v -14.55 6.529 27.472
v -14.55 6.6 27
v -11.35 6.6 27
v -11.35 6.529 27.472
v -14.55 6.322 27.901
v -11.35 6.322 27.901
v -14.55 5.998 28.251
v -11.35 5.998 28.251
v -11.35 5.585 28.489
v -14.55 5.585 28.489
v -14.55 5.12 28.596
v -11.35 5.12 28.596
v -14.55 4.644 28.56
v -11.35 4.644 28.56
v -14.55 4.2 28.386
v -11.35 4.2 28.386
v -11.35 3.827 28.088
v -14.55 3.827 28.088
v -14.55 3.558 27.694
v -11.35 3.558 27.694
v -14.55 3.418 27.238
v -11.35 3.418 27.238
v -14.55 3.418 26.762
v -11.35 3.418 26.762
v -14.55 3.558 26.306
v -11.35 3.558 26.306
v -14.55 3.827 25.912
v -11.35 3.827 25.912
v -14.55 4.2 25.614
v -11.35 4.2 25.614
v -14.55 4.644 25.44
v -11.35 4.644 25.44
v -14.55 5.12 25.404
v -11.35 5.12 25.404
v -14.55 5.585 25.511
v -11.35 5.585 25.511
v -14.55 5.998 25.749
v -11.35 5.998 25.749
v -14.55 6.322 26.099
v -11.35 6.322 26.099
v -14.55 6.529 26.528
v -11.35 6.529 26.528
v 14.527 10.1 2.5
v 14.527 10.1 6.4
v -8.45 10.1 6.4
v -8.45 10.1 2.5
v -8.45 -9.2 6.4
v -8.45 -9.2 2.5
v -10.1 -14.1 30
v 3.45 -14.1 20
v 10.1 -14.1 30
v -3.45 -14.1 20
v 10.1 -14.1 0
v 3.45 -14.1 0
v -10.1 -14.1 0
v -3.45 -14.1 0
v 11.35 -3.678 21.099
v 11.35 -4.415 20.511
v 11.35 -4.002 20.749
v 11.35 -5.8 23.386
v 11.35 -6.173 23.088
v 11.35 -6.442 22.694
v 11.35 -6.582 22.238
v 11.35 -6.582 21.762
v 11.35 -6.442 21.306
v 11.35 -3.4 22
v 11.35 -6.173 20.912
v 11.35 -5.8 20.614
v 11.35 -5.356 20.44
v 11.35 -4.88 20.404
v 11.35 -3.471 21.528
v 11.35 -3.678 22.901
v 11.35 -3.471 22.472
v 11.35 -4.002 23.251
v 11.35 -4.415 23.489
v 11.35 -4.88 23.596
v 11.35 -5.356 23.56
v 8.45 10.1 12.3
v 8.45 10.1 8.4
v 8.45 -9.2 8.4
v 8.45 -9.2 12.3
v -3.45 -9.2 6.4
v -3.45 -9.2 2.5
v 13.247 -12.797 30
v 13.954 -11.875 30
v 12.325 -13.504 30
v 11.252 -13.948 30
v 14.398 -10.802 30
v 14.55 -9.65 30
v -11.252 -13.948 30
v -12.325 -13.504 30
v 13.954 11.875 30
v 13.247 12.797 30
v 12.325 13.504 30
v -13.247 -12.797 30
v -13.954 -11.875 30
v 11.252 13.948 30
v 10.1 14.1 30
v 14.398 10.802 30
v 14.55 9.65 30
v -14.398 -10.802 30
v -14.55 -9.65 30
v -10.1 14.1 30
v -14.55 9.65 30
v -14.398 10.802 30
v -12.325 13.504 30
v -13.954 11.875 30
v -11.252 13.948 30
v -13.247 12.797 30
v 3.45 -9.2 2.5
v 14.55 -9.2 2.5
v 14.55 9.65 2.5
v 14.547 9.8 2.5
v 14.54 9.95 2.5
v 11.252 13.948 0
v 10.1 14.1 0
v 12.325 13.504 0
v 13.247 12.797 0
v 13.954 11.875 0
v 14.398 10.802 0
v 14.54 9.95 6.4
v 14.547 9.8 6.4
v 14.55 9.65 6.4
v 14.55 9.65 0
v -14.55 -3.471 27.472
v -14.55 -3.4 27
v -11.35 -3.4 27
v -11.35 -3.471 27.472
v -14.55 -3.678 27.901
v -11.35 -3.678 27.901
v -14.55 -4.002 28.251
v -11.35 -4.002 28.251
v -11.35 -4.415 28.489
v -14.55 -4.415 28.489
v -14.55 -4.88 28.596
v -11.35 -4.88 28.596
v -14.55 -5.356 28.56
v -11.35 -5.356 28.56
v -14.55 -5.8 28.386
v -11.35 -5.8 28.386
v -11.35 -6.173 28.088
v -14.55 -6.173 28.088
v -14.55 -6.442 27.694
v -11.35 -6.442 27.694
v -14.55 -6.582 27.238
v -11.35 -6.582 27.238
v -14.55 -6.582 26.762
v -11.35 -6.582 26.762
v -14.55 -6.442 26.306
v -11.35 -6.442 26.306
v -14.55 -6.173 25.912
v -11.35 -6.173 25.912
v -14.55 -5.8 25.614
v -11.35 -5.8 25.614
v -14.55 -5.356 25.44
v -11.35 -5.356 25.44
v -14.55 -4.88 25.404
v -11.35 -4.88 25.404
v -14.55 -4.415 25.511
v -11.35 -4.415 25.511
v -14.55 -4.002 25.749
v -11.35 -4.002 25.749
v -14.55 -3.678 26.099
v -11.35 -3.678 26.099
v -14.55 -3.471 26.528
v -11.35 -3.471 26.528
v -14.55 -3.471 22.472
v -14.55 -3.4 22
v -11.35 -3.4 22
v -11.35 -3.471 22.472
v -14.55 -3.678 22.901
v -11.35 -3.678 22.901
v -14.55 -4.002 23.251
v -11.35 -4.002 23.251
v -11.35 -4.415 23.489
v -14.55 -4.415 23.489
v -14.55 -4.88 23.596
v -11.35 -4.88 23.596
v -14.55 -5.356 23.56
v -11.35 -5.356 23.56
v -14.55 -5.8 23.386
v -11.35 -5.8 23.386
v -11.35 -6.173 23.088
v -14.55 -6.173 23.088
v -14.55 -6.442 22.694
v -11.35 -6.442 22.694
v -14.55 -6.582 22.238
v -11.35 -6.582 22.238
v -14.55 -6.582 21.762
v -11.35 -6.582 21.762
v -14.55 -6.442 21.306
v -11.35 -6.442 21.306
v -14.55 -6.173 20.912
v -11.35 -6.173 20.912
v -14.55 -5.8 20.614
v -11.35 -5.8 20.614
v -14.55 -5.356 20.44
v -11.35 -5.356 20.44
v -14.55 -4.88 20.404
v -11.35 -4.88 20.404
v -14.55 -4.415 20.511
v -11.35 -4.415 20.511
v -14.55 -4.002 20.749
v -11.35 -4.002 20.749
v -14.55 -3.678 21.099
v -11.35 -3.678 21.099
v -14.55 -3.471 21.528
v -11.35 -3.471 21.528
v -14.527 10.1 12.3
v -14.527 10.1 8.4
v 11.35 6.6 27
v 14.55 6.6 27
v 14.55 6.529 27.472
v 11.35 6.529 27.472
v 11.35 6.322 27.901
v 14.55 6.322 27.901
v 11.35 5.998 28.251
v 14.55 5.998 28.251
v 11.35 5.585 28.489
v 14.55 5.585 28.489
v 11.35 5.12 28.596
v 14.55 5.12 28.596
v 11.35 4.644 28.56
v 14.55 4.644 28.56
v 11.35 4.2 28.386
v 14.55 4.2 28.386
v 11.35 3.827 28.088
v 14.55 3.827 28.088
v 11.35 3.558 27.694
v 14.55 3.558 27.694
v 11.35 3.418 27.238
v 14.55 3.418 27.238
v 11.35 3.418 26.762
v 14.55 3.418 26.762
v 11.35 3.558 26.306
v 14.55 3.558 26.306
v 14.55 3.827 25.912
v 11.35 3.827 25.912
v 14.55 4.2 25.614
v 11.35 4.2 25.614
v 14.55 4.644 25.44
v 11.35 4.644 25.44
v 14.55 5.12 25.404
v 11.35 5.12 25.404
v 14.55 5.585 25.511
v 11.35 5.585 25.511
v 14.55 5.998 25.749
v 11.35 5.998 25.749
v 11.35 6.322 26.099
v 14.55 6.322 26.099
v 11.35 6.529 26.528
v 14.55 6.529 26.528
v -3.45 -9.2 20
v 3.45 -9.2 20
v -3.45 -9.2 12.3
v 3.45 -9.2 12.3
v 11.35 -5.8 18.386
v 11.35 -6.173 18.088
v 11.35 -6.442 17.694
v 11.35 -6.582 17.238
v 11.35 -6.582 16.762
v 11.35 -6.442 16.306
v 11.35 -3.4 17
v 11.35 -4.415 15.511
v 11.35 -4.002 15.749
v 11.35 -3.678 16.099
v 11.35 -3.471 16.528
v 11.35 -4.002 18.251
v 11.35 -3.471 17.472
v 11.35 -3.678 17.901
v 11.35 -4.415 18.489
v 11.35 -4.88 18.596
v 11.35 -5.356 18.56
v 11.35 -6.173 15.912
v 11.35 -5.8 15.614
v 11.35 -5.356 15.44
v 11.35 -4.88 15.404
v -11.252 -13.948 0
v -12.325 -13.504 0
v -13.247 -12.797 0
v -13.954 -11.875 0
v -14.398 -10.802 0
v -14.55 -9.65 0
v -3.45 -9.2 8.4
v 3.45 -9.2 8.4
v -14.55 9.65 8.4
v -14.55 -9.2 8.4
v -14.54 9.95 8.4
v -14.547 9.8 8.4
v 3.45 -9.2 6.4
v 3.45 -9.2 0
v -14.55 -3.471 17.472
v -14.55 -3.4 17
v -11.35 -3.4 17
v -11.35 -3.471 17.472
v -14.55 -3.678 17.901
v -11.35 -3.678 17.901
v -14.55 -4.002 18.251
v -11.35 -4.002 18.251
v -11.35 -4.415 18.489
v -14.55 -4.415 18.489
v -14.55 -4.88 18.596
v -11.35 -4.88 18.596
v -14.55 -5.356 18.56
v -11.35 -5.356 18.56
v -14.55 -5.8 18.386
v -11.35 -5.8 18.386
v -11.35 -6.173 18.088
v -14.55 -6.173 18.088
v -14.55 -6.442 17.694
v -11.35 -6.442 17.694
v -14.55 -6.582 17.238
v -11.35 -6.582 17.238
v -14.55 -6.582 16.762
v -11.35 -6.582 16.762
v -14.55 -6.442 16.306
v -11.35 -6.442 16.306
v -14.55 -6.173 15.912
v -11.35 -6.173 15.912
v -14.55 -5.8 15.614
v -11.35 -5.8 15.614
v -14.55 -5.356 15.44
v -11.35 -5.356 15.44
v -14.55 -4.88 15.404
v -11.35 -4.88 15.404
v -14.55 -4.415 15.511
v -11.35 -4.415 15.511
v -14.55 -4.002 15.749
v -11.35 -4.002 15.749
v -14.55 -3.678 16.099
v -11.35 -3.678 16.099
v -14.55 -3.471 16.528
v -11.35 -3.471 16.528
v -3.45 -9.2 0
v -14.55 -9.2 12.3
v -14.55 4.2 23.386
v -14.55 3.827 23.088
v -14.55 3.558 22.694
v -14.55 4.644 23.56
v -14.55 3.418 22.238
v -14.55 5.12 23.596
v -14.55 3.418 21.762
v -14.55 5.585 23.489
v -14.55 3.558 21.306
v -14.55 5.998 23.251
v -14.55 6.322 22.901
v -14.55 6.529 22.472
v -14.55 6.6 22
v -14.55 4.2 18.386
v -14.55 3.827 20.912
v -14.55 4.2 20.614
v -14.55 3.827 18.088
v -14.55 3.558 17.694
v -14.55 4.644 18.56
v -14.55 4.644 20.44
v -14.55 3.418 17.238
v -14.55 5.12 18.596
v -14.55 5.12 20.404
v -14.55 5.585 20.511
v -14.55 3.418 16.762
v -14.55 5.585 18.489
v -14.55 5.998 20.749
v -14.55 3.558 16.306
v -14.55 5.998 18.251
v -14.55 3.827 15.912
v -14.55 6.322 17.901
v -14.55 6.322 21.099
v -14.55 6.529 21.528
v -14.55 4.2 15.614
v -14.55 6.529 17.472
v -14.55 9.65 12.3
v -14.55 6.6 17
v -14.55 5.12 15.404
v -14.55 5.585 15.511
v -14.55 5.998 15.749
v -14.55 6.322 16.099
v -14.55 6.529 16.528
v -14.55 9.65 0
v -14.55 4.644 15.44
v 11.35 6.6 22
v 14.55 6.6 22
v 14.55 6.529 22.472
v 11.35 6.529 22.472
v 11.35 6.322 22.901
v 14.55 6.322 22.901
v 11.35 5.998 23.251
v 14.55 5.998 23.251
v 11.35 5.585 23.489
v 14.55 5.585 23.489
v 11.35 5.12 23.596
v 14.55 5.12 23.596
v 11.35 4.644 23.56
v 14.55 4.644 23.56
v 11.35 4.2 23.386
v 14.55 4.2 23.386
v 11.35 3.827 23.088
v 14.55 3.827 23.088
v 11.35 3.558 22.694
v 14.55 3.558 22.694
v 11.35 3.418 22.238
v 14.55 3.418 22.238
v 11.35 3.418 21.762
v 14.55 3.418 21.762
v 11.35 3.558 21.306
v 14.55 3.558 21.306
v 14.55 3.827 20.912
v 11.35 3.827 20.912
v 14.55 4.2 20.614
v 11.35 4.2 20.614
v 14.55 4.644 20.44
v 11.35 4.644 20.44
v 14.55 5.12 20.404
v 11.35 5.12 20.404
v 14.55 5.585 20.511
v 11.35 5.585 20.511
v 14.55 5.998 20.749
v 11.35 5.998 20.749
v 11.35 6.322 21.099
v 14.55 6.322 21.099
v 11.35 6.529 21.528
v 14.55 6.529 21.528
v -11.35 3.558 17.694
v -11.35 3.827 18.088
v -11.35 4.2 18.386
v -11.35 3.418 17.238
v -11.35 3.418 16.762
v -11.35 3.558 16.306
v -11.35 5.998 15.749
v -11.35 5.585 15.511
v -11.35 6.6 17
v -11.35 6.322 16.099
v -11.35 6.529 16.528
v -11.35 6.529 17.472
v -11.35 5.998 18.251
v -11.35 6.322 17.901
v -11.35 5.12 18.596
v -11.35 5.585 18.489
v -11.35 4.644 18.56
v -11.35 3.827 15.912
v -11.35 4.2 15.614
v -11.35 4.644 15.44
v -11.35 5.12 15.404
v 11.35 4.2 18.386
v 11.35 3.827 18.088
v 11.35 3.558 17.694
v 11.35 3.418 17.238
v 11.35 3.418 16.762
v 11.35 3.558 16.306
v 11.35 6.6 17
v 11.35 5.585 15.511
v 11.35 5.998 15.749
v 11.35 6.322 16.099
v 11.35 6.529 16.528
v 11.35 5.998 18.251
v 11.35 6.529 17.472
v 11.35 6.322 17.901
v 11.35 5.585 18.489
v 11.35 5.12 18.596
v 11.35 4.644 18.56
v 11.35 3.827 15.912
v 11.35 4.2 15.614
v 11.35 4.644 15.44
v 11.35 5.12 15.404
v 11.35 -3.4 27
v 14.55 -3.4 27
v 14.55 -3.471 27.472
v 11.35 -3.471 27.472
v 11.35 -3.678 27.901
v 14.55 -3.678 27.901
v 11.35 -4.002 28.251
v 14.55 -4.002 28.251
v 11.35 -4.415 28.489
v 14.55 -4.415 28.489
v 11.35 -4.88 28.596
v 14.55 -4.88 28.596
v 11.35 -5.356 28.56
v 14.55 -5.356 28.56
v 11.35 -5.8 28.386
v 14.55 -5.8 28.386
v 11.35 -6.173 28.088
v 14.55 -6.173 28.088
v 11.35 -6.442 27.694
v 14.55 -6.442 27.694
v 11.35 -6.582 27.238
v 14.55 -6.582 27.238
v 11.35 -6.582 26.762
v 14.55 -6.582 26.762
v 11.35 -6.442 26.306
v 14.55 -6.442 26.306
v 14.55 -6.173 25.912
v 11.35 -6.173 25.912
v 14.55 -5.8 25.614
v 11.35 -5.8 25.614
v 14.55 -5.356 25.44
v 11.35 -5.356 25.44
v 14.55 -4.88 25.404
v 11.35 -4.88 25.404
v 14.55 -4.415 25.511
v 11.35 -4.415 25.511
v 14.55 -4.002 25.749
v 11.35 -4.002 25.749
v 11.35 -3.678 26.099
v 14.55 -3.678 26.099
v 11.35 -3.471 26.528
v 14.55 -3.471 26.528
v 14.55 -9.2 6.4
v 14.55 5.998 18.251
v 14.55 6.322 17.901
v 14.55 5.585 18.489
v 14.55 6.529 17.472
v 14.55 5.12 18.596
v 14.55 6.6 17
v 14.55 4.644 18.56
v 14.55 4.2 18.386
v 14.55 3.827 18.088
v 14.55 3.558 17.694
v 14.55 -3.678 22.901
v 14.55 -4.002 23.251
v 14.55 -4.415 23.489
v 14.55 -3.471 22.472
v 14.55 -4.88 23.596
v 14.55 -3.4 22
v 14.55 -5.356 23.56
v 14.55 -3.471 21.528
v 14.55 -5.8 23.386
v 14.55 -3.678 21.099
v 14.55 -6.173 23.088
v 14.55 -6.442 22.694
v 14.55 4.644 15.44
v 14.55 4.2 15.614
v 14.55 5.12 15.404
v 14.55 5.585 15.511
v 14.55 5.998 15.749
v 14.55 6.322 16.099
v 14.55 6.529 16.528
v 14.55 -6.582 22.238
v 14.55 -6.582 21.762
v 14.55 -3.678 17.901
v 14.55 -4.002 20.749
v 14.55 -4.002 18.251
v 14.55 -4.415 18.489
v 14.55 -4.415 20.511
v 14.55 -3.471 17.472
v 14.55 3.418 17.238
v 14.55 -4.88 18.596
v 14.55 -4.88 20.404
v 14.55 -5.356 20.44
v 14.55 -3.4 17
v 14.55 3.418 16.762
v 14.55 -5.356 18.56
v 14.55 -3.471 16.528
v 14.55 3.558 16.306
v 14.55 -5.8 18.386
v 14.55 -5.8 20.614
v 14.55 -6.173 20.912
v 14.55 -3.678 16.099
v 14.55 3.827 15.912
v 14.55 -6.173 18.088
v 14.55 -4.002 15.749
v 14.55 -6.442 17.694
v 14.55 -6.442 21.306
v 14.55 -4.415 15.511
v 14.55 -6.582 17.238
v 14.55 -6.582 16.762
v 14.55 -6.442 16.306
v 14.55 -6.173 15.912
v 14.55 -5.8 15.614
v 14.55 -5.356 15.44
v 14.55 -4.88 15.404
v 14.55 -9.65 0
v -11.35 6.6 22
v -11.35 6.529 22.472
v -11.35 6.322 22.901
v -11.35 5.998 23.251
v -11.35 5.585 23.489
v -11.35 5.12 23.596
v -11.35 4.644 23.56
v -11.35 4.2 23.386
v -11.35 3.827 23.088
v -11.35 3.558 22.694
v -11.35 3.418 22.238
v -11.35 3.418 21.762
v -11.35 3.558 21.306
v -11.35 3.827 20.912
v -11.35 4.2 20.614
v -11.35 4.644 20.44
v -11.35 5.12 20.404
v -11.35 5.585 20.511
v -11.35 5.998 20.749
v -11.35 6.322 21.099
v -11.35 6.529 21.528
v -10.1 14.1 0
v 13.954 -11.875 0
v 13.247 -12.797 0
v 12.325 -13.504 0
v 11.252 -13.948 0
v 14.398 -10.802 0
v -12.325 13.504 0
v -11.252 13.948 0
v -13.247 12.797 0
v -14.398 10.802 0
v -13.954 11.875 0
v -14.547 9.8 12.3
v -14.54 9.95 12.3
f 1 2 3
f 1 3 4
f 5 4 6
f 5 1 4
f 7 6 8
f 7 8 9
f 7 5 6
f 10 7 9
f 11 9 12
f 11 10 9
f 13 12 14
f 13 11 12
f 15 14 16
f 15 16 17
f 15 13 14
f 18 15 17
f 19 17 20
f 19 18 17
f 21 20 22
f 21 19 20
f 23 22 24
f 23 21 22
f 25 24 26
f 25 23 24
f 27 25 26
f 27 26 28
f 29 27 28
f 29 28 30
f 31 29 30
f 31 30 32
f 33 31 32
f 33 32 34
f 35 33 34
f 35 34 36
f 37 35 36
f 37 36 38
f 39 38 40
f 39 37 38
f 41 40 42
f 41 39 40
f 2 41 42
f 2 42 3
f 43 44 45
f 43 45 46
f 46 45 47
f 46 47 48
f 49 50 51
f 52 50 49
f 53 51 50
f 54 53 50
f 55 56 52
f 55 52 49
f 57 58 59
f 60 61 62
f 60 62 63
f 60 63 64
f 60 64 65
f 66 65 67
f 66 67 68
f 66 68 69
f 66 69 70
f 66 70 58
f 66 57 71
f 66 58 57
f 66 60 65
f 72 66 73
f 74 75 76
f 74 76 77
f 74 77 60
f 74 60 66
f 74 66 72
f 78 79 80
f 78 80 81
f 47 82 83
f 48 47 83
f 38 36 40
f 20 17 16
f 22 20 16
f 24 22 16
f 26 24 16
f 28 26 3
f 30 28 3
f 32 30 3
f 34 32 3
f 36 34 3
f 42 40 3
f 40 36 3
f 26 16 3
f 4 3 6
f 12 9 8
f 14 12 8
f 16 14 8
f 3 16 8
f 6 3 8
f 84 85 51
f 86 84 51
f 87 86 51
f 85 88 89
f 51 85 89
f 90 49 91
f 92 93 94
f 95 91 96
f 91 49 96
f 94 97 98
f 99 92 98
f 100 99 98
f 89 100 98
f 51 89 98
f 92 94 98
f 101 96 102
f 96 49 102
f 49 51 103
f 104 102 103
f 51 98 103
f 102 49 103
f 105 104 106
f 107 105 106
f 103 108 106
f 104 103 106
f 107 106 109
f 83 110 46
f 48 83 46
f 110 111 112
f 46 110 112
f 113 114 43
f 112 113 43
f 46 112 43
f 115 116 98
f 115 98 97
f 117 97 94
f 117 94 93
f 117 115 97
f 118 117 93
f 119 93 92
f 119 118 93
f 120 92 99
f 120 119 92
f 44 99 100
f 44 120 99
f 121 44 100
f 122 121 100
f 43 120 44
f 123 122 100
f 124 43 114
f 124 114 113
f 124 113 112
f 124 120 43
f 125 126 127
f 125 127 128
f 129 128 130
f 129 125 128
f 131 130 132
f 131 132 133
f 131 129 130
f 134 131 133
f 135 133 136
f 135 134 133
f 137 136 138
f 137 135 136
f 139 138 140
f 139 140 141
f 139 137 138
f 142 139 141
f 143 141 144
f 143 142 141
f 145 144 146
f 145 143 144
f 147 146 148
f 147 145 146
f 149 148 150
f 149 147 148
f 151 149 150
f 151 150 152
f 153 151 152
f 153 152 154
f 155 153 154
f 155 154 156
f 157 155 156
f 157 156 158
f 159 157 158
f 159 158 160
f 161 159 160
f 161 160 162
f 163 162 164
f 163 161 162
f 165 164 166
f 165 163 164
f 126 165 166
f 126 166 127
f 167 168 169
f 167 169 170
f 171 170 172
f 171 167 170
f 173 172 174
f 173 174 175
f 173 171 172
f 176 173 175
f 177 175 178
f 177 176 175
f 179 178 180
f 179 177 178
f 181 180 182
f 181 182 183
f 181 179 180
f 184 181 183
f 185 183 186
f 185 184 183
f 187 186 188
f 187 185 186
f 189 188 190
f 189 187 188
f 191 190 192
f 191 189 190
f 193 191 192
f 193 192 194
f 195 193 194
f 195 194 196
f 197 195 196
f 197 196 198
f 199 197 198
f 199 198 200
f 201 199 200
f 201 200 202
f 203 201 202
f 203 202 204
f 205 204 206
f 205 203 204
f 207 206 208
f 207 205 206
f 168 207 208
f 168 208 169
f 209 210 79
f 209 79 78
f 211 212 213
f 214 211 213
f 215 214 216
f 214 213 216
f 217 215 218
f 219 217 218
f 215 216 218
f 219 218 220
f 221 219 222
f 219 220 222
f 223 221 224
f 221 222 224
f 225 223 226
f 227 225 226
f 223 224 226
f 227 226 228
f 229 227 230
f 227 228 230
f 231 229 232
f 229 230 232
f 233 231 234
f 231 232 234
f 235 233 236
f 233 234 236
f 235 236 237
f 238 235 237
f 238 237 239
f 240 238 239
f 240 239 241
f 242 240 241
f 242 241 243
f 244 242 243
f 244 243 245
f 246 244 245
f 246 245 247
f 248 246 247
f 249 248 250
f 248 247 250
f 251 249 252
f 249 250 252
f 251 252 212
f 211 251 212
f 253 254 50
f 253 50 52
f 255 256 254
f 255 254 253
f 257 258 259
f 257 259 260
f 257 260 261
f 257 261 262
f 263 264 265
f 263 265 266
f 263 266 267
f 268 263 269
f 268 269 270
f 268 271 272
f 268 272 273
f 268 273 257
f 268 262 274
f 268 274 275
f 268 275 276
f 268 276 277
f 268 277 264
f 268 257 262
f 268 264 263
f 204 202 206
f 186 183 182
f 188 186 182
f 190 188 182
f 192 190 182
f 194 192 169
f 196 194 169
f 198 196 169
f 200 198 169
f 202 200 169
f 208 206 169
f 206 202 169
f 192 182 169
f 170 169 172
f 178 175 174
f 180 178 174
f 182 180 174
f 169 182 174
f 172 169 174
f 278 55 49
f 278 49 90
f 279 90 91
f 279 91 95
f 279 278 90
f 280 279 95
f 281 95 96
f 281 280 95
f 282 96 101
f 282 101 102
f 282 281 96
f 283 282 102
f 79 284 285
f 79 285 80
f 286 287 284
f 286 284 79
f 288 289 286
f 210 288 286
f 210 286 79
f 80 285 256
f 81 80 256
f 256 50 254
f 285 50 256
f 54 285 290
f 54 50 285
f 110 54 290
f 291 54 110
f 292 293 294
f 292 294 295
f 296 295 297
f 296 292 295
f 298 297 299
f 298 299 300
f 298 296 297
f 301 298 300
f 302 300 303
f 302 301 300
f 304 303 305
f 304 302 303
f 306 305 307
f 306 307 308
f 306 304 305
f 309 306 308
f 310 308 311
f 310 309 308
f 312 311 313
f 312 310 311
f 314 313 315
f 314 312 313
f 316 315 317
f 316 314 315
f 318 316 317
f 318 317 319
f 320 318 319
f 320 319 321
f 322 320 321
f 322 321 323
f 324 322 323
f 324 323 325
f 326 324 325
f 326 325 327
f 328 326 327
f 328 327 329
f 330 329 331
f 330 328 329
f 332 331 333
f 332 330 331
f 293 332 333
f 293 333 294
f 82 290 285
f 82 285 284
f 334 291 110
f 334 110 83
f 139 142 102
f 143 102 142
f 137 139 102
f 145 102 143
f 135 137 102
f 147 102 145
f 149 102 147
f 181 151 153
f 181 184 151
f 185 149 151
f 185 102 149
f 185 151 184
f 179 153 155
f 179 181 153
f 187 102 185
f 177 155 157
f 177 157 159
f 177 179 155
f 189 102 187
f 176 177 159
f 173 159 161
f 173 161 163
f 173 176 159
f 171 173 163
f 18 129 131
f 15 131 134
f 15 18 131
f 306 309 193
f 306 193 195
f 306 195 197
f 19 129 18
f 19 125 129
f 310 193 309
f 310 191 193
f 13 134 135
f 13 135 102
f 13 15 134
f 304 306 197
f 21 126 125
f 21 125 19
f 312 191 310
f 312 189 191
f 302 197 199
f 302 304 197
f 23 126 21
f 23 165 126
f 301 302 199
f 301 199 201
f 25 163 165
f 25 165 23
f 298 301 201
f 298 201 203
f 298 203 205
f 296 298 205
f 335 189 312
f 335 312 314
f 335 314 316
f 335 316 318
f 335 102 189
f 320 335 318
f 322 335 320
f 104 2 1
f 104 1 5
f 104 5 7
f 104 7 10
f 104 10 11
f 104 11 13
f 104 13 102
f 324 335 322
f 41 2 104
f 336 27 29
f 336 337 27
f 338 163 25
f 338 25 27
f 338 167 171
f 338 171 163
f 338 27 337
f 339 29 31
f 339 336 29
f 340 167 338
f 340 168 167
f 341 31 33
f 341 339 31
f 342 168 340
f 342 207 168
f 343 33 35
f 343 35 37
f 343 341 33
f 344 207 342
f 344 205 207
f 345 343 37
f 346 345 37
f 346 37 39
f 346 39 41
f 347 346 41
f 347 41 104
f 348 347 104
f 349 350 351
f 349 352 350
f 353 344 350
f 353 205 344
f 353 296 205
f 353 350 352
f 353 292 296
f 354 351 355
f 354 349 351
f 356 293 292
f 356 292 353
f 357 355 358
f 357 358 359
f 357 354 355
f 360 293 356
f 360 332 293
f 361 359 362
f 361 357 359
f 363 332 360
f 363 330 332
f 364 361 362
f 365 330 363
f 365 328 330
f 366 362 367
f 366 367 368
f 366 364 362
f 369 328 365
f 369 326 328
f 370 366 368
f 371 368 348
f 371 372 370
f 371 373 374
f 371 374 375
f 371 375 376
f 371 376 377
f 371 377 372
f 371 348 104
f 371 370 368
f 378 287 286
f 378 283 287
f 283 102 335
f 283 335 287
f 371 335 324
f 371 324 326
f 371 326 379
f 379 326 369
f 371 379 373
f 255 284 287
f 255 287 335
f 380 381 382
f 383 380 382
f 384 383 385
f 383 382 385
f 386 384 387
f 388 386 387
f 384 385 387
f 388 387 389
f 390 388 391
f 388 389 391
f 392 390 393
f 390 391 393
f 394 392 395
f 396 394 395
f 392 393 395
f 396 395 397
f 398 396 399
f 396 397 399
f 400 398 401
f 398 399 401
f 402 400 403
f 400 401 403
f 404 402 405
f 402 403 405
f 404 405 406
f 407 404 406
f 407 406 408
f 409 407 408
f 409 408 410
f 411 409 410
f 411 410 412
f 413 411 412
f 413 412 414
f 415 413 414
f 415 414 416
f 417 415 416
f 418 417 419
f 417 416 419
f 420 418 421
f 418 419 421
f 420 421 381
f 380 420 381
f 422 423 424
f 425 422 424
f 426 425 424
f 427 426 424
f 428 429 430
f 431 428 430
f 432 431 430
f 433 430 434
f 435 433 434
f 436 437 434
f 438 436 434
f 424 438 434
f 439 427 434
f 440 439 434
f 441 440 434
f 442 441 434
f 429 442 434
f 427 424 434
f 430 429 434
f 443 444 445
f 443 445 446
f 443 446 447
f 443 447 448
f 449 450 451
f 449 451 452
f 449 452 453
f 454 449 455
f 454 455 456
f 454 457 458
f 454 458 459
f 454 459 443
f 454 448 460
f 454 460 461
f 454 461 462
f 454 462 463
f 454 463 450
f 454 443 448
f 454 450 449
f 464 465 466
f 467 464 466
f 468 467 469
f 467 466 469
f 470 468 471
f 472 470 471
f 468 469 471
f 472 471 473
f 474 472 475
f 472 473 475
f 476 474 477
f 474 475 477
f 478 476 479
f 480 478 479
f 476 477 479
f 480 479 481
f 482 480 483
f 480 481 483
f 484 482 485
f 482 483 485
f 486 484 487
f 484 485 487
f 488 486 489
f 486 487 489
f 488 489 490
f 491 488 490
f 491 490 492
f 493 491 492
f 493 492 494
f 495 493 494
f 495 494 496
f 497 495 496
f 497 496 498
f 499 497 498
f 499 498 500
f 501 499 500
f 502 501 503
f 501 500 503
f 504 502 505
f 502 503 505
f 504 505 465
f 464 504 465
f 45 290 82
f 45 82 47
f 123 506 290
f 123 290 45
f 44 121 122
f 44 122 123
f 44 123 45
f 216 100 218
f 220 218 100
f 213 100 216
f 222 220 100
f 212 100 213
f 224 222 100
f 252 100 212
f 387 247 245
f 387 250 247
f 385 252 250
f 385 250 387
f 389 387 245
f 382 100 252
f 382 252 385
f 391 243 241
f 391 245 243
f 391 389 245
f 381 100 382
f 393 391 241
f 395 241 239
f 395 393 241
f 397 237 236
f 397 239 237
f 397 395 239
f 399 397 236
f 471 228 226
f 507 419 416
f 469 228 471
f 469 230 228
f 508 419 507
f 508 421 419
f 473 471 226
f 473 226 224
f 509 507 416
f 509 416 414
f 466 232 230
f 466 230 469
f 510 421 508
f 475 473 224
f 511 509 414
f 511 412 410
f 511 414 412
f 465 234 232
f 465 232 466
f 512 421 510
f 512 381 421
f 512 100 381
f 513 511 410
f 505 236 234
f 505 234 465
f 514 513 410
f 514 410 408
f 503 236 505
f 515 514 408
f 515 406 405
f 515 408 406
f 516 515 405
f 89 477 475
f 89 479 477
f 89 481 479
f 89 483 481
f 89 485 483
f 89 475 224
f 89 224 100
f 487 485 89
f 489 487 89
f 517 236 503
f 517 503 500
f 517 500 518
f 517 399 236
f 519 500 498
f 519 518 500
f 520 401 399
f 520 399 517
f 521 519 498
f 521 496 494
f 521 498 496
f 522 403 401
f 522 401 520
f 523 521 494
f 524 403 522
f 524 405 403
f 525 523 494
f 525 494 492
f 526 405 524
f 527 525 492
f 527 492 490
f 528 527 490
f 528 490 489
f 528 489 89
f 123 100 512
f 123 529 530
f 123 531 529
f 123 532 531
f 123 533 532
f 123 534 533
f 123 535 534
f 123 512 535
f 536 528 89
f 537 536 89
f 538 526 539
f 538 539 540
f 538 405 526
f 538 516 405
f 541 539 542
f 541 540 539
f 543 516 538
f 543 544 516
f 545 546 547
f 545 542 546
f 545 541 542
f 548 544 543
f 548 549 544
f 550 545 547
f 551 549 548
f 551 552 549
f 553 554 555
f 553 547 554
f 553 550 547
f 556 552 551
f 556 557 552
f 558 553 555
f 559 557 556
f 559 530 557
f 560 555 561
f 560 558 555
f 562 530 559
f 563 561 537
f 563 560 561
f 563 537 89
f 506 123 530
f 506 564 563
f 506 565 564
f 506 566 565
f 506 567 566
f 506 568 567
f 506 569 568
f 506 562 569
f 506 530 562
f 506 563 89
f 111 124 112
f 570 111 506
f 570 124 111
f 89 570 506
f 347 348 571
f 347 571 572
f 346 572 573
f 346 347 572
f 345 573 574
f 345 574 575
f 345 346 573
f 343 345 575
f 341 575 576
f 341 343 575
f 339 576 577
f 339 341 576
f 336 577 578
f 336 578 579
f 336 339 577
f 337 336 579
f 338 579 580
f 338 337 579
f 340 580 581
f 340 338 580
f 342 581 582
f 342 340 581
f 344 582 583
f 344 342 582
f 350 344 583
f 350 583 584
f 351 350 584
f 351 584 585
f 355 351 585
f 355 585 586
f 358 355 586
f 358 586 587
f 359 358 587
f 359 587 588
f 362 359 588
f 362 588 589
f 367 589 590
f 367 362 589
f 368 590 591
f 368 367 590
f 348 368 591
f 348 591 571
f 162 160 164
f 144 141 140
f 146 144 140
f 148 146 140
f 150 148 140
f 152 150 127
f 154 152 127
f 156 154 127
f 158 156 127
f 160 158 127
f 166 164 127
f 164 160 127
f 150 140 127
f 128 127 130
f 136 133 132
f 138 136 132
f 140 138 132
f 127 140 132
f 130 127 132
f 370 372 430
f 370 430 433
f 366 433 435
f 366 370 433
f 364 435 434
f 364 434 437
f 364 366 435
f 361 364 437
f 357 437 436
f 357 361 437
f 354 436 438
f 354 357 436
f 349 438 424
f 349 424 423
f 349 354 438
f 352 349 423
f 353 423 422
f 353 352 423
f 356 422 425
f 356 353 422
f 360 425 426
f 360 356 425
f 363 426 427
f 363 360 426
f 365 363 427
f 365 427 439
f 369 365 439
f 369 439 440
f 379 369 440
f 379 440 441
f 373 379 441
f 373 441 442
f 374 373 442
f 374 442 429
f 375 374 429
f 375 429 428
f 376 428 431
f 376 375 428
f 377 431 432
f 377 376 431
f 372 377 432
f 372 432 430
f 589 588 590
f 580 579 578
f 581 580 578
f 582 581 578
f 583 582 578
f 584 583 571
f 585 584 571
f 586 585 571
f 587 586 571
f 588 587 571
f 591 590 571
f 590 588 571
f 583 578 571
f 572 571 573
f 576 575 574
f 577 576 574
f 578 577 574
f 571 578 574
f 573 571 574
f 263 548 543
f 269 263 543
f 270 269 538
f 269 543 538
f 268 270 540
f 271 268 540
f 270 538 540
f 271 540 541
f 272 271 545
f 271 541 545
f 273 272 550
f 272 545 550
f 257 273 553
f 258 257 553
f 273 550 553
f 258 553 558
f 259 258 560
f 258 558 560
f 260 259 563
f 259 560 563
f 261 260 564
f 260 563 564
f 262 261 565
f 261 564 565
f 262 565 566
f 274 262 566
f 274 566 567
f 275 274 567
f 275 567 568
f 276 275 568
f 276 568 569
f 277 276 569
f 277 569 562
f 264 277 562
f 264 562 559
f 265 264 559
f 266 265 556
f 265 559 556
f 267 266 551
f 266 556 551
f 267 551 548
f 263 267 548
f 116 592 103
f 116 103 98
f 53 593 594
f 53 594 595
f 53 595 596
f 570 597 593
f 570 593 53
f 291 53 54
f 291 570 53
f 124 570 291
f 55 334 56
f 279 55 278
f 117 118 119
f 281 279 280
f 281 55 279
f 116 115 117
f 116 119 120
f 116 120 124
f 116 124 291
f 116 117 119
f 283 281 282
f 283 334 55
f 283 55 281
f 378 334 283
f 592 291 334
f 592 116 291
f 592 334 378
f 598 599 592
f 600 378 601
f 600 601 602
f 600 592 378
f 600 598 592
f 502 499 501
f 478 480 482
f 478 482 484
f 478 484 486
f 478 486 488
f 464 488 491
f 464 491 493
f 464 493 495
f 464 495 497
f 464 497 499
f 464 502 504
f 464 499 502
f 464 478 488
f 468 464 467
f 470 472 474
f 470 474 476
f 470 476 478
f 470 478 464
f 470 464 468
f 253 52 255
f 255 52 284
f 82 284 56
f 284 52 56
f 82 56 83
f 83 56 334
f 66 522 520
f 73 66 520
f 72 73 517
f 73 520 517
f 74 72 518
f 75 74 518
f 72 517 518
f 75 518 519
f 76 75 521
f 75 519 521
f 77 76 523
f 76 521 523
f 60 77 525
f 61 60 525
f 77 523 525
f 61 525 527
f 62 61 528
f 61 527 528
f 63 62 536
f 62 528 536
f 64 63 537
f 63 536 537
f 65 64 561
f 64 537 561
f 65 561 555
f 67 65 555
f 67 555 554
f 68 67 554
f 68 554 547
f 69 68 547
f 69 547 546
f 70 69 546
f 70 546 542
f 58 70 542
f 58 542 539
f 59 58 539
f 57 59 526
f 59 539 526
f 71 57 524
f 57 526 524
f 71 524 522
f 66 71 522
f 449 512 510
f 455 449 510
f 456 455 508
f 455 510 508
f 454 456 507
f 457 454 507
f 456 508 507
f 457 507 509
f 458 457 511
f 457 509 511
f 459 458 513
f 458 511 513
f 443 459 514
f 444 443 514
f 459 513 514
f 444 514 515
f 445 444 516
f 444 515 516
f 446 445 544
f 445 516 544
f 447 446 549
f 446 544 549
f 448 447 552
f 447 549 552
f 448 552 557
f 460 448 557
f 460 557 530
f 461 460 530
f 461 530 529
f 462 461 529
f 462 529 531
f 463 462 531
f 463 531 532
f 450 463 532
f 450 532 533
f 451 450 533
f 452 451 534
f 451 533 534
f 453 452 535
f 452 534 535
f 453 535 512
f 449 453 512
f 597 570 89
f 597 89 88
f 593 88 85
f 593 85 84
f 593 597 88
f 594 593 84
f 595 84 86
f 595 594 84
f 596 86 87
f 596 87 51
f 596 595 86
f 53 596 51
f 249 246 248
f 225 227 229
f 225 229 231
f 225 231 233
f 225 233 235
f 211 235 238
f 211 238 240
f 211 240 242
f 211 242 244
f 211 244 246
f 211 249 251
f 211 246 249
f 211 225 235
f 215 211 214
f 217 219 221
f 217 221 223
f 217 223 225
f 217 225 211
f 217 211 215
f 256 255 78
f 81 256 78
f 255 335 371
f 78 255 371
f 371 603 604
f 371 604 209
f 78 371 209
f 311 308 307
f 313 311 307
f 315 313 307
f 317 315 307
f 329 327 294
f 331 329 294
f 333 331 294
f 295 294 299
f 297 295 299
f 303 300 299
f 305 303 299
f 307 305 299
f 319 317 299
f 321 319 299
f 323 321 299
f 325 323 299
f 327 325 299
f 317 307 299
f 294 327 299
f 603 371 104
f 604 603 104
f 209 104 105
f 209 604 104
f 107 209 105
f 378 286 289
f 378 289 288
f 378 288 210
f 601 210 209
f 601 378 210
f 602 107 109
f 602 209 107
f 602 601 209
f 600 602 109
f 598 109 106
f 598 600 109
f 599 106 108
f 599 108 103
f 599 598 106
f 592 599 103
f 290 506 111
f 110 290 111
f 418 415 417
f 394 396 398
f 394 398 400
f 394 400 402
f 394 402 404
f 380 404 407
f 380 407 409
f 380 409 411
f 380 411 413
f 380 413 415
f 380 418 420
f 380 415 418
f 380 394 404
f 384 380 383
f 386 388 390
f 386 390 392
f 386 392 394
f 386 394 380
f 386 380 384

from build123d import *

# Parameters (mm, degrees)
EXTRUDE_1_DEPTH     = 30
SKETCH_2_R          = 1.6
CUT_EXTRUDE_1_DEPTH = 3.2
SKETCH_4_W          = 3.9
SKETCH_4_H          = 19.3
CUT_EXTRUDE_2_DEPTH = 23
SKETCH_5_W          = 3.9
SKETCH_5_H          = 19.3
CUT_EXTRUDE_3_DEPTH = 23
SKETCH_6_W          = 6.9
SKETCH_6_H          = 4.9
CUT_EXTRUDE_4_DEPTH = 20


with BuildPart() as part:
    # 草图1 → 凸台-拉伸1 (new body)
    with BuildSketch(Plane.XY):
        with BuildLine():
            Line((-10.1, 14.1), (10.1, 14.1))
            ThreePointArc((10.1, 14.1), (13.246625176, 12.796625176), (14.55, 9.65))
            Line((14.55, 9.65), (14.55, -9.65))
            ThreePointArc((14.55, -9.65), (13.246625176, -12.796625176), (10.1, -14.1))
            Line((10.1, -14.1), (-10.1, -14.1))
            ThreePointArc((-10.1, -14.1), (-13.246625176, -12.796625176), (-14.55, -9.65))
            Line((-14.55, -9.65), (-14.55, 9.65))
            ThreePointArc((-14.55, 9.65), (-13.246625176, 12.796625176), (-10.1, 14.1))
        make_face()
    extrude(amount=EXTRUDE_1_DEPTH)

    # 草图2 → 切除-拉伸1 (cut)
    with BuildSketch(Plane(origin=(14.55, 0, 0), x_dir=(0, 0, -1), z_dir=(1, 0, 0))):
        with Locations(Location((-27, -5, 0), (0, 0, 90))):
            Circle(SKETCH_2_R)
        with Locations(Location((-22, -5, 0), (0, 0, 90))):
            Circle(SKETCH_2_R)
        with Locations(Location((-17, -5, 0), (0, 0, 90))):
            Circle(SKETCH_2_R)
        with Locations(Location((-22, 5, 0), (0, 0, 90))):
            Circle(SKETCH_2_R)
        with Locations(Location((-17, 5, 0), (0, 0, 90))):
            Circle(SKETCH_2_R)
        with Locations(Location((-27, 5, 0), (0, 0, 90))):
            Circle(SKETCH_2_R)
    cut_extrude_1 = extrude(amount=-CUT_EXTRUDE_1_DEPTH, mode=Mode.SUBTRACT)

    # 镜向1: 切除-拉伸1 across plane
    add(cut_extrude_1.mirror(Plane(origin=(0, 0, 0), x_dir=(0, 0, 1), z_dir=(1, 0, 0))), mode=Mode.SUBTRACT)

    # 草图4 → 切除-拉伸2 (cut)
    with BuildSketch(Plane(origin=(14.55, 0, 0), x_dir=(0, 0, -1), z_dir=(1, 0, 0))):
        with Locations((-4.45, 0.45)):
            Rectangle(SKETCH_4_W, SKETCH_4_H)
    extrude(amount=-CUT_EXTRUDE_2_DEPTH, mode=Mode.SUBTRACT)

    # 草图5 → 切除-拉伸3 (cut)
    with BuildSketch(Plane.ZY.offset(14.55)):
        with Locations((10.35, 0.45)):
            Rectangle(SKETCH_5_W, SKETCH_5_H)
    extrude(amount=-CUT_EXTRUDE_3_DEPTH, mode=Mode.SUBTRACT)

    # 草图6 → 切除-拉伸4 (cut)
    with BuildSketch(Plane(origin=(0, 0, 0), x_dir=(-1, 0, 0), z_dir=(0, 0, -1))):
        with Locations((0, -11.65)):
            Rectangle(SKETCH_6_W, SKETCH_6_H)
    extrude(amount=-CUT_EXTRUDE_4_DEPTH, mode=Mode.SUBTRACT)


solid = part.part
